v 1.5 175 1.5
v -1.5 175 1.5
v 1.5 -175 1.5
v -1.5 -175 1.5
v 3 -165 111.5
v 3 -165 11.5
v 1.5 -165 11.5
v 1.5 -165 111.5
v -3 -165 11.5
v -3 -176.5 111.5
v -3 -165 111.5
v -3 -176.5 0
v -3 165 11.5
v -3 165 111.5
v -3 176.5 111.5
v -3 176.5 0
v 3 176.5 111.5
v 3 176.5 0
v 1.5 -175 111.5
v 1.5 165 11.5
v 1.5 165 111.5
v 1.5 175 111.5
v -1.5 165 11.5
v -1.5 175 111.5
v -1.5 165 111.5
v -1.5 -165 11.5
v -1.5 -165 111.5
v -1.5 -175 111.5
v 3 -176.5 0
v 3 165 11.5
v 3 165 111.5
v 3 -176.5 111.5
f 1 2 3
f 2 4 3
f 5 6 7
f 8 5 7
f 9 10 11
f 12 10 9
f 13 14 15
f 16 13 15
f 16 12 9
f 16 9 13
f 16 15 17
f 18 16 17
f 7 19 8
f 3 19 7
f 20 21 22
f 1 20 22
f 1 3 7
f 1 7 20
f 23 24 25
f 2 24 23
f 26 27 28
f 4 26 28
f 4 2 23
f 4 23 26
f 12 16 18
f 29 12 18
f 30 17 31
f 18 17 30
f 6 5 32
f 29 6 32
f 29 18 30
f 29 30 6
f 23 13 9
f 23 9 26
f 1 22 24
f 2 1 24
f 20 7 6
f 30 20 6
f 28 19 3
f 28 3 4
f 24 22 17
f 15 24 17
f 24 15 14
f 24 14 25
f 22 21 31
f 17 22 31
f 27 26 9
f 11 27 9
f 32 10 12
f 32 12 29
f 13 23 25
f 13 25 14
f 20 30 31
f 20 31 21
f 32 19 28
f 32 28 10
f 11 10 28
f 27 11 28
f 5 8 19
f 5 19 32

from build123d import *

# Parameters (mm, degrees)
F0_W     = 6
F0_H     = 353
F1_DEPTH = 1.5
F2_W     = 6
F2_H     = 353
F2_W_2   = 3
F2_H_2   = 350
F3_DEPTH = 10
F5_DEPTH = 100
F6_W     = 228.872508
F6_H     = 47.288619
F7_DEPTH = 25


with BuildPart() as f1:
    # F0 (on Top) → F1 (new body)
    with BuildSketch(Plane.XY):
        Rectangle(F0_W, F0_H)
    extrude(amount=F1_DEPTH)

    # F2 (on face) → F3 (join)
    with BuildSketch(Plane.XY.offset(1.5)):
        Rectangle(F2_W, F2_H)
        Rectangle(F2_W_2, F2_H_2, mode=Mode.SUBTRACT)
    extrude(amount=F3_DEPTH)

    # F4 (on face) → F5 (join)
    with BuildSketch(Plane.XY.offset(11.5)):
        Polygon((1.5, -175), (-1.5, -175), (-1.5, -165), (-3, -165), (-3, -176.5), (3, -176.5), (3, -165), (1.5, -165), align=None)
    extrude(amount=F5_DEPTH)

    # F6 (on face) → F7 (cut)
    with BuildSketch(Plane.YZ.offset(3)):
        with Locations((114.436254, 23.644309)):
            Rectangle(F6_W, F6_H)
    extrude(amount=-F7_DEPTH, mode=Mode.SUBTRACT)

    # F8: F1 across plane


with BuildPart() as f1_1:
    add(f1.part)
    add(f1.part.mirror(Plane.XZ))


solid = f1_1.part
